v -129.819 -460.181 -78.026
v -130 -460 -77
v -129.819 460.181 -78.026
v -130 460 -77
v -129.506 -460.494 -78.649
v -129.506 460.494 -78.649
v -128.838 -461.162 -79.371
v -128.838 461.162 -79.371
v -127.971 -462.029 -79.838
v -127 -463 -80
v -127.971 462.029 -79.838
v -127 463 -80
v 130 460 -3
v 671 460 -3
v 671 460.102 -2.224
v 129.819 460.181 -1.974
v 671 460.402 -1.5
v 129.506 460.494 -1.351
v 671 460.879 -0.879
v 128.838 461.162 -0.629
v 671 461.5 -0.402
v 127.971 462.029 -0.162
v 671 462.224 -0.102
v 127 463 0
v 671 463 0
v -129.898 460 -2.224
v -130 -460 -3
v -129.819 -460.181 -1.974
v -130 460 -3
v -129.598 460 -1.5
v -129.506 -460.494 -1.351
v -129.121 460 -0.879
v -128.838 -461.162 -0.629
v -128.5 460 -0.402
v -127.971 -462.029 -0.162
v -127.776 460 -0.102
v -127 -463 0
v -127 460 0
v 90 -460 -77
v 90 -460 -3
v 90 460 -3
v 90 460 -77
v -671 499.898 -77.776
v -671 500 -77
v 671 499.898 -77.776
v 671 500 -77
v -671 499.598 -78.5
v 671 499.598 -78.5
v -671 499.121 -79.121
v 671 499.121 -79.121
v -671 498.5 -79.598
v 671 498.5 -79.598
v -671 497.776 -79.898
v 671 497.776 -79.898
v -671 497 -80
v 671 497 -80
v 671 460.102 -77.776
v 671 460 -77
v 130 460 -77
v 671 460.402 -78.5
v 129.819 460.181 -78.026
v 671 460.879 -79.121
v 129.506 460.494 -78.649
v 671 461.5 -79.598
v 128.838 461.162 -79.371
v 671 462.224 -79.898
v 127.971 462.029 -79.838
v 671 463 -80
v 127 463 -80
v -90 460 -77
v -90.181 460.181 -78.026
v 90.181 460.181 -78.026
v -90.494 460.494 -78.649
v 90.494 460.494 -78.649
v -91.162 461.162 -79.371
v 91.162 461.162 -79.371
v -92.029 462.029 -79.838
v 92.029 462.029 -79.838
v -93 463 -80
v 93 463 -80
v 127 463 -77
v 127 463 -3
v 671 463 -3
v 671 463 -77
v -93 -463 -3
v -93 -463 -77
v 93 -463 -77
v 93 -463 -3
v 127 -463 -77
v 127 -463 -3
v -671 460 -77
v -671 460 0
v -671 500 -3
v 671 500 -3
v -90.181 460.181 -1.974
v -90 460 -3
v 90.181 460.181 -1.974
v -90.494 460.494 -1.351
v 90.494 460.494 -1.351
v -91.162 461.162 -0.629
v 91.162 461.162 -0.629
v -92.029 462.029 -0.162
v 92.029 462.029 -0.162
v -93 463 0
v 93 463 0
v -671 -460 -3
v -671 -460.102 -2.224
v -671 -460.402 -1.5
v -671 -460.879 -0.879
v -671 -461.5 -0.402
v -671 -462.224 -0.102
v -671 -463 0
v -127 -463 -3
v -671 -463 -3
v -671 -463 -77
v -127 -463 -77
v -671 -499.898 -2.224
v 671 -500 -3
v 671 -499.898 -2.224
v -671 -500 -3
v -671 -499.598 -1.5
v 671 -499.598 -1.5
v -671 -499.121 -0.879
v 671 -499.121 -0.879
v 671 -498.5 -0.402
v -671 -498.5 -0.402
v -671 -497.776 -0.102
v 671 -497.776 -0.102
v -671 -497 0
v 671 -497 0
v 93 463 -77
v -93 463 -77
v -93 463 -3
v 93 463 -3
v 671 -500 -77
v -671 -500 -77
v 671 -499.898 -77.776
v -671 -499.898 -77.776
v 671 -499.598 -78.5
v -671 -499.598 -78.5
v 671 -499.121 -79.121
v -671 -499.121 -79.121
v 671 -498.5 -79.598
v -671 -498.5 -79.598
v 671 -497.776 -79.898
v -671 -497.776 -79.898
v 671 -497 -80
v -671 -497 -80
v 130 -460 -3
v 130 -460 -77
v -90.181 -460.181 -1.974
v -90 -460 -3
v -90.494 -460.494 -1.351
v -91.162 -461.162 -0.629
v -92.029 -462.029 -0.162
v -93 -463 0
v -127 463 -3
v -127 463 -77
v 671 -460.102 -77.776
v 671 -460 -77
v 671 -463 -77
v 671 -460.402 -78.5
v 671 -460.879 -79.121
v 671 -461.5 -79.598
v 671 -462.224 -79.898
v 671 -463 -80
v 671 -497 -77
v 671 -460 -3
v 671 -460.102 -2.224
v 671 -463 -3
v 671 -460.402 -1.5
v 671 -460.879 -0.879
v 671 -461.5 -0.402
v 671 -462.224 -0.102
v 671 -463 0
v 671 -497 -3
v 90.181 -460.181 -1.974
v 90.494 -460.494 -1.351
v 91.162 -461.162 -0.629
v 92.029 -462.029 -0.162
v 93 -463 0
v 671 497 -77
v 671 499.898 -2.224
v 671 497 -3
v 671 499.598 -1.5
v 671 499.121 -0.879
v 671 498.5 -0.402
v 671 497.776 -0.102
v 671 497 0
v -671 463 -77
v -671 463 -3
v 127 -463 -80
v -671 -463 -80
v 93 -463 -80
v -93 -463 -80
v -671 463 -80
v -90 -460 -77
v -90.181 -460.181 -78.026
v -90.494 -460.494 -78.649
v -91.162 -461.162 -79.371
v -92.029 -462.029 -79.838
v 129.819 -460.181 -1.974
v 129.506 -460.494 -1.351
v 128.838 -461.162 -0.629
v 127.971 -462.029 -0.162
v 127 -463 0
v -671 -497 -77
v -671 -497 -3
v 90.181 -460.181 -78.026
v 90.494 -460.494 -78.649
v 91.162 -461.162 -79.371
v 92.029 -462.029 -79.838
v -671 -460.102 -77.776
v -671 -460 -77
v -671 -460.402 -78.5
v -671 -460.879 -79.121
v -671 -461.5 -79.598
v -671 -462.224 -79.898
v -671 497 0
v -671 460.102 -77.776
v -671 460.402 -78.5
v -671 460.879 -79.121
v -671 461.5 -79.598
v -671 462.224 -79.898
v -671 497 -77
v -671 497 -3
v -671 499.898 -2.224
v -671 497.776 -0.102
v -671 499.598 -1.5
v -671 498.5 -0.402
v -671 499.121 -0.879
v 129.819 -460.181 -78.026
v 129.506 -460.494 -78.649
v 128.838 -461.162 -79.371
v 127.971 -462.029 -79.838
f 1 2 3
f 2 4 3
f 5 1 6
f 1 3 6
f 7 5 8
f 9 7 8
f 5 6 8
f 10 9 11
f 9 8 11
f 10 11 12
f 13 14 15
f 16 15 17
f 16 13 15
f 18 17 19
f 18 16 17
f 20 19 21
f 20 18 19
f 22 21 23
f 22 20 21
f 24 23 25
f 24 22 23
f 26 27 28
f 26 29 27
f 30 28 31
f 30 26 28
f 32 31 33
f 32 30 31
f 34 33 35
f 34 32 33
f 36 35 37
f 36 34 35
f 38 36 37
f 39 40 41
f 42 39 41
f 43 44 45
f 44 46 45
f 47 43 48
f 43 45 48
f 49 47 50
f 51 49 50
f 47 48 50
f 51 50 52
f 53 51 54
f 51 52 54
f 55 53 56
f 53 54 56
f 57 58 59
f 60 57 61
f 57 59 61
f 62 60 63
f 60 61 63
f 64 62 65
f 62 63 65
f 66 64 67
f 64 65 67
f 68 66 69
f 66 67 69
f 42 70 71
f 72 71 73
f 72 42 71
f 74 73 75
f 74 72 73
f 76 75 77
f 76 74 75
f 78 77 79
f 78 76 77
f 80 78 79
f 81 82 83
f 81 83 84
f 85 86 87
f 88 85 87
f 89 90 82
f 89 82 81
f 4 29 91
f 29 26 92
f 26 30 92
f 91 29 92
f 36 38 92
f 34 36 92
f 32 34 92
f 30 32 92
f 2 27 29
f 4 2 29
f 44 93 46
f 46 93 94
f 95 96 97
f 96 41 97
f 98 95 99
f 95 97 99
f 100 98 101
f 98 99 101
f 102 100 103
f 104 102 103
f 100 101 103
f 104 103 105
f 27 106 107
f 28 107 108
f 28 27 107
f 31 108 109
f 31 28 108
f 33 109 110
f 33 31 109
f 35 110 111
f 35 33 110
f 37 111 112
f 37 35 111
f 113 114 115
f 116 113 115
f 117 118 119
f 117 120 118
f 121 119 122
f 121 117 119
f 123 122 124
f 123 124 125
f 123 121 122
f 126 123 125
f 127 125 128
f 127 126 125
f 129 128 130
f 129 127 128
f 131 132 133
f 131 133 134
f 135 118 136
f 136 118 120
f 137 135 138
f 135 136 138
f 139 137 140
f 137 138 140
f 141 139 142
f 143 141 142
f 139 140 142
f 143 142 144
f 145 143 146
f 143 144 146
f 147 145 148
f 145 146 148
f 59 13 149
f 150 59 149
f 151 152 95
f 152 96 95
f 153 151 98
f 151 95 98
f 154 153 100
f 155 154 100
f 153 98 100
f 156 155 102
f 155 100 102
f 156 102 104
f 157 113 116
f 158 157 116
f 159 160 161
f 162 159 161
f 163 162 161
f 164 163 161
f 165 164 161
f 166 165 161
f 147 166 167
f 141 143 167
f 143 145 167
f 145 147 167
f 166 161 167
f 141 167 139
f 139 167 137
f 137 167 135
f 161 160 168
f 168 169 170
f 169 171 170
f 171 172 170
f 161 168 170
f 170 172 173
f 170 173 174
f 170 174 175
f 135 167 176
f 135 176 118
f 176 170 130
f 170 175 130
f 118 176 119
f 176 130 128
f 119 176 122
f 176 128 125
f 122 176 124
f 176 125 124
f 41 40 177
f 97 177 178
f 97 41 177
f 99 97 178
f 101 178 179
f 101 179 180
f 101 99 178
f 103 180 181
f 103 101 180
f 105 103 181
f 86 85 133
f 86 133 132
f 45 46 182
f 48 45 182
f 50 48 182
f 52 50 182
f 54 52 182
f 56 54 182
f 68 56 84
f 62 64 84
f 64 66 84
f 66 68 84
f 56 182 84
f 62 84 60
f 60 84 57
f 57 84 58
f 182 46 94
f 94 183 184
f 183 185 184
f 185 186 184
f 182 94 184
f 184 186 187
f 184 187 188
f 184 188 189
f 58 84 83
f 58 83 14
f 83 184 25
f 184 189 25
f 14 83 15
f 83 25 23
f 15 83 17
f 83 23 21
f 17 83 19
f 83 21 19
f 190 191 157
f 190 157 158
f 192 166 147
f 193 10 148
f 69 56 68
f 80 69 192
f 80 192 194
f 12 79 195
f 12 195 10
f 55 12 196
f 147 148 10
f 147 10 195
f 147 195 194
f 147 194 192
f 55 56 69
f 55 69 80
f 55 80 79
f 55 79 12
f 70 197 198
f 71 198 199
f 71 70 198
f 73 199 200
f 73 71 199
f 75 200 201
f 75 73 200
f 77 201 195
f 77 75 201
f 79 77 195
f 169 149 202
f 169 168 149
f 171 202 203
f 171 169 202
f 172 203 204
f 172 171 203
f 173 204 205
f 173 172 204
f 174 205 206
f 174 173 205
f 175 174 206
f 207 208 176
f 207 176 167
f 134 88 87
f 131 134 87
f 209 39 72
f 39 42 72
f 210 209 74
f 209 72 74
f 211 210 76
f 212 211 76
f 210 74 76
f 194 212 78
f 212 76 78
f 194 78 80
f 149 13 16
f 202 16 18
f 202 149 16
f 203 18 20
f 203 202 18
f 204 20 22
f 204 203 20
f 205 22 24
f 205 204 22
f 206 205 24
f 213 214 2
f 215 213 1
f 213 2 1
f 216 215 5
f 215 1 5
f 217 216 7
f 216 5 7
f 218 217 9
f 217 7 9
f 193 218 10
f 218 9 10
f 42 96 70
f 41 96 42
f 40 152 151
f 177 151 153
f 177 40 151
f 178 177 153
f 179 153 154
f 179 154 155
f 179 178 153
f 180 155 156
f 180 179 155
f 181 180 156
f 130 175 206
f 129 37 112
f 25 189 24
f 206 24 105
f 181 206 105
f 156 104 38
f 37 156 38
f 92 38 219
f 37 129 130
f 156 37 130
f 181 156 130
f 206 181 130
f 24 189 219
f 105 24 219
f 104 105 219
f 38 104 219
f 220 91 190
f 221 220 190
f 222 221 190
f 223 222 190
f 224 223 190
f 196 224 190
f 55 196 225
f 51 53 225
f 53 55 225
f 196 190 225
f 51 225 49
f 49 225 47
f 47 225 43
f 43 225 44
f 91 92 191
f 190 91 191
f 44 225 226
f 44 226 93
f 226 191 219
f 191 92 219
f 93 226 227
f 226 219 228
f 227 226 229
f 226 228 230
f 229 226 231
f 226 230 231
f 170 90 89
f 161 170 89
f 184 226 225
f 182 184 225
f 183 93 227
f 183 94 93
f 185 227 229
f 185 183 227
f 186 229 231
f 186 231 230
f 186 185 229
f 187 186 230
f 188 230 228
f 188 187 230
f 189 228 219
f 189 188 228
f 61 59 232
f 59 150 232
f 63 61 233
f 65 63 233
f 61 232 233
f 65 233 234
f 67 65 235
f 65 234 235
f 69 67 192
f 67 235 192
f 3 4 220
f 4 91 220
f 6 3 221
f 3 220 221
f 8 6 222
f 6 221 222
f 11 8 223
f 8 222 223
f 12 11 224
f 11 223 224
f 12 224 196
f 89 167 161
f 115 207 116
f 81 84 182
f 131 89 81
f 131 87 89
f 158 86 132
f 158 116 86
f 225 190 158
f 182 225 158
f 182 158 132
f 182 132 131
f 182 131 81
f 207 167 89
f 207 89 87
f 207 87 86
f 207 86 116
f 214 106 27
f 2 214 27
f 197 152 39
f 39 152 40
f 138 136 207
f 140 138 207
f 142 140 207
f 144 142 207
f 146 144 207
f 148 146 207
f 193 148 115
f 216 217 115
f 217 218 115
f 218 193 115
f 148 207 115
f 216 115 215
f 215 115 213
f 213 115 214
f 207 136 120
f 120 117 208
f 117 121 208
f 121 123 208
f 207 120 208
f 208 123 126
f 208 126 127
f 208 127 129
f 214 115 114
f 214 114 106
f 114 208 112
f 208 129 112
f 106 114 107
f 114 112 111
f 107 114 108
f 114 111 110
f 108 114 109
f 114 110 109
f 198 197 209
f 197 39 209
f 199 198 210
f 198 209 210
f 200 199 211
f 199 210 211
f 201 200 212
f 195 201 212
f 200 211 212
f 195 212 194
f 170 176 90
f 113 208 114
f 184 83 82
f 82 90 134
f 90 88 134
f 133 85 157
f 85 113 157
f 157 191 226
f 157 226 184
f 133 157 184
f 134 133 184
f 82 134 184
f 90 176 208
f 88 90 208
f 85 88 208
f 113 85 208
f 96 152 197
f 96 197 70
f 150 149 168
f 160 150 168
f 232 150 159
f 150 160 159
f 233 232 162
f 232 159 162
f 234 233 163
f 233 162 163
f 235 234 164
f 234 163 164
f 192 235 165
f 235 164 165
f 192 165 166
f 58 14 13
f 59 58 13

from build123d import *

# Parameters (mm, degrees)
SKETCH1_W               = 180
SKETCH1_H               = 920
BOSS_EXTRUDE1_DEPTH     = 80
FILLET2_R               = 3
SHELL1_START            = -497
SHELL1_OUTLINE_W        = 34
SHELL1_OUTLINE_H        = 74
SHELL1_DEPTH            = 994
SHELL1_2_OUTLINE_W      = 541
SHELL1_2_OUTLINE_H      = 74
SHELL1_2_OUTLINE_W_2    = 186
SHELL1_2_DEPTH          = 34
SHELL1_START_2          = 463
SHELL1_3_OUTLINE_W      = 541
SHELL1_3_OUTLINE_H      = 74
SHELL1_3_OUTLINE_W_2    = 186
SHELL1_3_DEPTH          = 34
CUT_EXTRUDE1_DEPTH      = 1435.351421375
CUT_EXTRUDE1_DEPTH_BACK = 1435.351421375
SKETCH2_W               = 74
SKETCH2_H               = 34


# Read off the part's stored shape, not the designer's step: Shell1
with BuildPart() as part:
    # Sketch1 → Boss-Extrude1 (new body)
    with BuildSketch(Plane.XY):
        Polygon((671, -500), (-671, -500), (-671, -460), (-130, -460), (-130, 460), (-671, 460), (-671, 500), (671, 500), (671, 460), (130, 460), (130, -460), (671, -460), align=None)
        Rectangle(SKETCH1_W, SKETCH1_H, mode=Mode.SUBTRACT)
    extrude(amount=-BOSS_EXTRUDE1_DEPTH)

    # Fillet2
    fillet2_edges = [part.edges().sort_by_distance(p)[0] for p in [
        (-90, 0, 0),
        (0, 460, 0),
        (400.5, 460, 0),
        (0, 500, 0),
        (0, -500, 0),
        (-400.5, -460, 0),
        (-130, 0, 0),
        (400.5, -460, 0),
        (0, -460, 0),
        (90, 0, 0),
        (130, 0, 0),
        (400.5, -460, -80),
        (0, -500, -80),
        (-400.5, -460, -80),
        (0, -460, -80),
        (130, 0, -80),
        (90, 0, -80),
        (-90, 0, -80),
        (-130, 0, -80),
        (-400.5, 460, -80),
        (0, 460, -80),
        (400.5, 460, -80),
        (0, 500, -80),
    ]]
    fillet(fillet2_edges, radius=FILLET2_R)

    # Shell1 outline → Shell1 (cut)
    with BuildSketch(Plane(origin=(0, 0, 0), x_dir=(1, 0, 0), z_dir=(0, 1, 0)).offset(SHELL1_START)):
        with Locations((-110, 40)):
            Rectangle(SHELL1_OUTLINE_W, SHELL1_OUTLINE_H)
        with Locations((110, 40)):
            Rectangle(SHELL1_OUTLINE_W, SHELL1_OUTLINE_H)
    extrude(amount=SHELL1_DEPTH, mode=Mode.SUBTRACT)

    # Shell1 2 outline → Shell1 2 (cut)
    with BuildSketch(Plane(origin=(0, 0, 0), x_dir=(1, 0, 0), z_dir=(0, 1, 0)).offset(SHELL1_START)):
        with Locations((-397.5, 40)):
            Rectangle(SHELL1_2_OUTLINE_W, SHELL1_2_OUTLINE_H)
        with Locations((0, 40)):
            Rectangle(SHELL1_2_OUTLINE_W_2, SHELL1_2_OUTLINE_H)
        with Locations((397.5, 40)):
            Rectangle(SHELL1_2_OUTLINE_W, SHELL1_2_OUTLINE_H)
    extrude(amount=SHELL1_2_DEPTH, mode=Mode.SUBTRACT)

    # Shell1 3 outline → Shell1 3 (cut)
    with BuildSketch(Plane(origin=(0, 0, 0), x_dir=(1, 0, 0), z_dir=(0, 1, 0)).offset(SHELL1_START_2)):
        with Locations((-397.5, 40)):
            Rectangle(SHELL1_3_OUTLINE_W, SHELL1_3_OUTLINE_H)
        with Locations((0, 40)):
            Rectangle(SHELL1_3_OUTLINE_W_2, SHELL1_3_OUTLINE_H)
        with Locations((397.5, 40)):
            Rectangle(SHELL1_3_OUTLINE_W, SHELL1_3_OUTLINE_H)
    extrude(amount=SHELL1_3_DEPTH, mode=Mode.SUBTRACT)

    # Sketch2 → Cut-Extrude1 (cut, two sides: drawn at the far end of the back side and taken through both)
    with BuildSketch(Plane(origin=(671, 0, 0), x_dir=(0, 0, -1), z_dir=(1, 0, 0)).offset(-CUT_EXTRUDE1_DEPTH_BACK)):
        with Locations((40, 480)):
            Rectangle(SKETCH2_W, SKETCH2_H)
        with Locations((40, -480)):
            Rectangle(SKETCH2_W, SKETCH2_H)
    extrude(amount=CUT_EXTRUDE1_DEPTH + CUT_EXTRUDE1_DEPTH_BACK, mode=Mode.SUBTRACT)


solid = part.part
